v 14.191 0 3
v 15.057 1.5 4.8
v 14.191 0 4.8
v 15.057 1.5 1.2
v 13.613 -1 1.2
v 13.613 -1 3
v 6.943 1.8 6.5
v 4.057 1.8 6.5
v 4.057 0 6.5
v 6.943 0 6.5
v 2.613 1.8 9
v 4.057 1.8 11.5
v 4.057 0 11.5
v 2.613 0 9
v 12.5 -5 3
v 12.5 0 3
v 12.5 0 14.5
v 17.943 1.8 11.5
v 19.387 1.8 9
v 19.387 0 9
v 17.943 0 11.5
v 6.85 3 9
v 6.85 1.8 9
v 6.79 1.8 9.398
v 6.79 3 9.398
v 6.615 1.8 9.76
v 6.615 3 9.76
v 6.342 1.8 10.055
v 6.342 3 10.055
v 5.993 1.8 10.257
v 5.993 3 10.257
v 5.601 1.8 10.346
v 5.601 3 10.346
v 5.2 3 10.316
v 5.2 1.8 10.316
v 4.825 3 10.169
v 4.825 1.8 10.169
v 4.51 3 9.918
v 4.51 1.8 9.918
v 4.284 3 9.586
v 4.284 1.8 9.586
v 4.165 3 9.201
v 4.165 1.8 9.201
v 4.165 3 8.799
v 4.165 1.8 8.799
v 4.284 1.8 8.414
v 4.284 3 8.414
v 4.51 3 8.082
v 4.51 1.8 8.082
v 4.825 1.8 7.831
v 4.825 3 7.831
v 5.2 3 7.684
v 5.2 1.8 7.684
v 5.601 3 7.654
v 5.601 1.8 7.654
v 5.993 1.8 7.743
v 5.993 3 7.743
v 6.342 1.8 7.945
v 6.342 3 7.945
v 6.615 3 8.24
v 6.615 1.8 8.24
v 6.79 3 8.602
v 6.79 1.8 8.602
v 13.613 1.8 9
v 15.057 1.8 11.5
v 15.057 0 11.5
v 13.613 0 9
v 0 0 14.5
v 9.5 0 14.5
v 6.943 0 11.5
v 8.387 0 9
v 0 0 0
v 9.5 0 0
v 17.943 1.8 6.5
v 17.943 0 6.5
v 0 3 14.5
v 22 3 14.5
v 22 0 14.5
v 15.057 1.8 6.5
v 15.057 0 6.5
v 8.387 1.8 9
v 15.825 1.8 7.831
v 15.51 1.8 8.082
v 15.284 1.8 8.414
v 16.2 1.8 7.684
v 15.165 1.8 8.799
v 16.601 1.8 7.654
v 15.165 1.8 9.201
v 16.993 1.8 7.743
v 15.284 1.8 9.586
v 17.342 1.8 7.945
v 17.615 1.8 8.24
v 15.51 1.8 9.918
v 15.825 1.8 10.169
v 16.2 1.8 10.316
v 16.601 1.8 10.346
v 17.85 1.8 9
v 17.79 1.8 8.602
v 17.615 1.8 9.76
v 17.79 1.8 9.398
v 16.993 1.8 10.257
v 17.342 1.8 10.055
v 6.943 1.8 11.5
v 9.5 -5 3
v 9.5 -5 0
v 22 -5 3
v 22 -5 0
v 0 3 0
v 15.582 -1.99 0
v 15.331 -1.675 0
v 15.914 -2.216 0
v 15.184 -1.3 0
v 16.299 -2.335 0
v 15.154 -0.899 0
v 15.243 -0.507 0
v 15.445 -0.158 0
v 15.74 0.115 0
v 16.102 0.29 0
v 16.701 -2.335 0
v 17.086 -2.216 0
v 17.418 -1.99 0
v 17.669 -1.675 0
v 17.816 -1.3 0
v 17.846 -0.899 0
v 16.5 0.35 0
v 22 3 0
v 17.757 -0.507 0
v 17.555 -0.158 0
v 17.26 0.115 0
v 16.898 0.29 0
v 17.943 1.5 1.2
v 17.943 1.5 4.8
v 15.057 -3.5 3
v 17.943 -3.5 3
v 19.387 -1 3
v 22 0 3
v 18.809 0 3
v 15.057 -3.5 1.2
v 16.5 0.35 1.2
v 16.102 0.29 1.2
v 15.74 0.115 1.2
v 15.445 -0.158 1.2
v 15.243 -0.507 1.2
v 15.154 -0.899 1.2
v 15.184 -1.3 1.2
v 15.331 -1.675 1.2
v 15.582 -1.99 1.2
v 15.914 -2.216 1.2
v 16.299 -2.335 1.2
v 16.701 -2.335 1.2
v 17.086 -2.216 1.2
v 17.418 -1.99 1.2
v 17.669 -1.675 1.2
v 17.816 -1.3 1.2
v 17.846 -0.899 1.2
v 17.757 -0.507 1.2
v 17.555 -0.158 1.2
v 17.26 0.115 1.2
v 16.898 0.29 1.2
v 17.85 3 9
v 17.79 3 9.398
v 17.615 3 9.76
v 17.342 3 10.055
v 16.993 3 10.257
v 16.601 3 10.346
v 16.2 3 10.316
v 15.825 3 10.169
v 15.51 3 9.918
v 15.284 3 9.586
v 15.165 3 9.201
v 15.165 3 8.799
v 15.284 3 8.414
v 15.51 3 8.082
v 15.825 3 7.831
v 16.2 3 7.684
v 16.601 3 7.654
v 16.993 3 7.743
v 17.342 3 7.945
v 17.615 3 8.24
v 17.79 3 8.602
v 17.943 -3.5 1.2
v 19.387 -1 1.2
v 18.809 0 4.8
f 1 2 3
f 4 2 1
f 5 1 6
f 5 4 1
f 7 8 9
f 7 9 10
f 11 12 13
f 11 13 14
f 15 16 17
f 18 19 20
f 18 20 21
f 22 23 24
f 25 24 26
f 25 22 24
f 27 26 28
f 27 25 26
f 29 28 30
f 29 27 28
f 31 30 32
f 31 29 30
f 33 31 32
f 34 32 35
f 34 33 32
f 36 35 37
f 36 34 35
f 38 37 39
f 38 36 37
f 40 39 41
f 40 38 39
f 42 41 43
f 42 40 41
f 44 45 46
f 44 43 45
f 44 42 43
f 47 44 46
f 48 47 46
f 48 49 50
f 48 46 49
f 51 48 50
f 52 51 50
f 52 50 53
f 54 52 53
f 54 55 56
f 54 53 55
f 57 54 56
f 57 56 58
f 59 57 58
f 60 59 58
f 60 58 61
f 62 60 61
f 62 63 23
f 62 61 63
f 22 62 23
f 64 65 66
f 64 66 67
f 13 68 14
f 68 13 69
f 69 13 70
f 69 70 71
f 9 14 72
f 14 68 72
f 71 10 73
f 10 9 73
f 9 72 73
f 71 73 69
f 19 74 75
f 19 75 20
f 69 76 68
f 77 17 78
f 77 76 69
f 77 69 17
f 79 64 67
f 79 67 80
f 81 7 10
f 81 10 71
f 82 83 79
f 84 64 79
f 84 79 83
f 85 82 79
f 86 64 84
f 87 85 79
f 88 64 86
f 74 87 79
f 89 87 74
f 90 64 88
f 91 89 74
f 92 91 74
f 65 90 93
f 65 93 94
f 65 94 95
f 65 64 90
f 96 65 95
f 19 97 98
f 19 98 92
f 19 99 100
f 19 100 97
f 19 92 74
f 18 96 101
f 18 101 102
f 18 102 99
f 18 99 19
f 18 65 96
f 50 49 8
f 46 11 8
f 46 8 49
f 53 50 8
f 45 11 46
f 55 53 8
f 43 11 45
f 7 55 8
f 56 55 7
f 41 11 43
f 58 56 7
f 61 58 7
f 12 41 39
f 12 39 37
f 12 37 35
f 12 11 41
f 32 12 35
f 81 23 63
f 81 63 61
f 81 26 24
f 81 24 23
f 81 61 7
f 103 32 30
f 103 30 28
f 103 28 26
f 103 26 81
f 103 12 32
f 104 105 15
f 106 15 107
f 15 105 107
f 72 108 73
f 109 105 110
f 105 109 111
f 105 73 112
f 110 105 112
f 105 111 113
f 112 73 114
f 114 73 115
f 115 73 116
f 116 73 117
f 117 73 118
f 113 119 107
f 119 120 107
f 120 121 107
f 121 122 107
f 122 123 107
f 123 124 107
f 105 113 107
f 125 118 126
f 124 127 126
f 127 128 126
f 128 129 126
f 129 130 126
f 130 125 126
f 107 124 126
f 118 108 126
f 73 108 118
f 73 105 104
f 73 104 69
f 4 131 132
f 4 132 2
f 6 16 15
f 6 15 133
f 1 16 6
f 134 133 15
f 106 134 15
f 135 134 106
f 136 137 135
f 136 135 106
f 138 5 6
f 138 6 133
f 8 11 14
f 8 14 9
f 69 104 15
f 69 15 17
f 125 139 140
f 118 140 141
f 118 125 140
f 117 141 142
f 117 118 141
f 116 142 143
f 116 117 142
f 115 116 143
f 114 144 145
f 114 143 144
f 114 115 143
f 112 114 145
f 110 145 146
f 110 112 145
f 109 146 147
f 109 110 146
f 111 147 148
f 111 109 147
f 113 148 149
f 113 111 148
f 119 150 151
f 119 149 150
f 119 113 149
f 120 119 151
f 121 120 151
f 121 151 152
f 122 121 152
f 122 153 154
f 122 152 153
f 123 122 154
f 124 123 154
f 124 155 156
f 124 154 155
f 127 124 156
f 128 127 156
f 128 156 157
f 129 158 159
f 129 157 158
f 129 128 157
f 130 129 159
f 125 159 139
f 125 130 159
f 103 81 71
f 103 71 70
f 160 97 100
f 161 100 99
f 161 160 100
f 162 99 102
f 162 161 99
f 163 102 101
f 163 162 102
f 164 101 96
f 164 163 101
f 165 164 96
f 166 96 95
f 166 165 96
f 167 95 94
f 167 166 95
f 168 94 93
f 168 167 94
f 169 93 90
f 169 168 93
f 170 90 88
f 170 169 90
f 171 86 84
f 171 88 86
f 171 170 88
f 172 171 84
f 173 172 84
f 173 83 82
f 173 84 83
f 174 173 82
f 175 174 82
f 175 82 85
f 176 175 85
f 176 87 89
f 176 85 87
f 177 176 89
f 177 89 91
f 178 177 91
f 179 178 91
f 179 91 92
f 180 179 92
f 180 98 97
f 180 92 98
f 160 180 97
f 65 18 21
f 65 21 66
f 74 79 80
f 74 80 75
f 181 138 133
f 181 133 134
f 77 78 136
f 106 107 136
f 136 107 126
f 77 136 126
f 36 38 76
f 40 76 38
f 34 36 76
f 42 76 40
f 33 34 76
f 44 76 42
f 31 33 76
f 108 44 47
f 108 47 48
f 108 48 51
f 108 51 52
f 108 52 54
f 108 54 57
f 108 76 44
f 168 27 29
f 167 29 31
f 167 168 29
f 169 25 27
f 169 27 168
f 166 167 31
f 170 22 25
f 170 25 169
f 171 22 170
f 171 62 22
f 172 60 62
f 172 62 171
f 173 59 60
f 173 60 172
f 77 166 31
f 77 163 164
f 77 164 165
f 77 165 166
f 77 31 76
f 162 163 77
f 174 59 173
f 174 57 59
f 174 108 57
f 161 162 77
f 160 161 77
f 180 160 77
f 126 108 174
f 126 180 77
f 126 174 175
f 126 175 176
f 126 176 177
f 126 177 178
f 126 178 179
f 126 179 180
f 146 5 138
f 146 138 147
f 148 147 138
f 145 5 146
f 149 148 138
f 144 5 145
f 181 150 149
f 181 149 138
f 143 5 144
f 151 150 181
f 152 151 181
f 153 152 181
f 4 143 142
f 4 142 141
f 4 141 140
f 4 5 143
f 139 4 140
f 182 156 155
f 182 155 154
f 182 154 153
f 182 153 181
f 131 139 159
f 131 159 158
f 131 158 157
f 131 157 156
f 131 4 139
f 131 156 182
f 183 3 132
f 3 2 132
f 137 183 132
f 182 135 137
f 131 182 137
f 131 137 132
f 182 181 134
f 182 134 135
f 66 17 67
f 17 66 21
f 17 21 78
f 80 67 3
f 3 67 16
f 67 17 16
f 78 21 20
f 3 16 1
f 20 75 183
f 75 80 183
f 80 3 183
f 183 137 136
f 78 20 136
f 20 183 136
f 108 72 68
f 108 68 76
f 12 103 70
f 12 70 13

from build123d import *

# Parameters (mm, degrees)
EXTRUDE003_DEPTH  = 3.6
CYLINDER002_R     = 1.35
CYLINDER002_DEPTH = 3
EXTRUDE002_DEPTH  = 1.8
CYLINDER003_R     = 1.35
CYLINDER003_DEPTH = 30
EXTRUDE001_DEPTH  = 1.8
CYLINDER_R        = 1.35
CYLINDER_DEPTH    = 3
BOX_W             = 22
BOX_H             = 3
BOX_DEPTH         = 14.5
BOX001_W          = 12.5
BOX001_H          = 5
BOX001_DEPTH      = 3
EXTRUDE_DEPTH     = 3


with BuildPart() as extrude003:
    # Sketch003 → Extrude003 (new body)
    with BuildSketch(Plane.XY):
        Polygon((2.8868, 0), (1.4434, 2.500042), (-1.4434, 2.500042), (-2.8868, 0), (-1.4434, -2.500042), (1.4434, -2.500042), align=None)
    extrude(amount=EXTRUDE003_DEPTH)


with BuildPart() as extrude003_1:
    # Extrude003 placement: moved
    add(extrude003.part.moved(Location((16.5, -1, 1.2))))


with BuildPart() as hole03:
    # Cylinder002 → Cylinder002 (new body)
    with BuildSketch(Plane(origin=(16.5, -1, 0), x_dir=(0, 1, 0), z_dir=(0, 0, 1))):
        Circle(CYLINDER002_R)
    extrude(amount=CYLINDER002_DEPTH)

    # Fusion002: union Extrude003
    add(extrude003_1.part)


with BuildPart() as extrude002:
    # Sketch002 → Extrude002 (new body)
    with BuildSketch(Plane(origin=(16.5, 1.8, 9), x_dir=(1, 0, 0), z_dir=(0, -1, 0))):
        Polygon((2.8868, 0), (1.4434, 2.500042), (-1.4434, 2.500042), (-2.8868, 0), (-1.4434, -2.500042), (1.4434, -2.500042), align=None)
    extrude(amount=EXTRUDE002_DEPTH)


with BuildPart() as hole02:
    # Cylinder003 → Cylinder003 (new body)
    with BuildSketch(Plane(origin=(16.5, 3, 9), x_dir=(1, 0, 0), z_dir=(0, -1, 0))):
        Circle(CYLINDER003_R)
    extrude(amount=CYLINDER003_DEPTH)

    # Fusion001: union Extrude002
    add(extrude002.part)


with BuildPart() as extrude001:
    # Sketch001 → Extrude001 (new body)
    with BuildSketch(Plane(origin=(5.5, 1.8, 9), x_dir=(1, 0, 0), z_dir=(0, -1, 0))):
        Polygon((2.8868, 0), (1.4434, 2.500042), (-1.4434, 2.500042), (-2.8868, 0), (-1.4434, -2.500042), (1.4434, -2.500042), align=None)
    extrude(amount=EXTRUDE001_DEPTH)


with BuildPart() as hole01:
    # Cylinder → Cylinder (new body)
    with BuildSketch(Plane(origin=(5.5, 3, 9), x_dir=(1, 0, 0), z_dir=(0, -1, 0))):
        Circle(CYLINDER_R)
    extrude(amount=CYLINDER_DEPTH)

    # Fusion: union Extrude001
    add(extrude001.part)


with BuildPart() as cut001:
    # Box → Box (new body)
    with BuildSketch(Plane.XY):
        with Locations((11, 1.5)):
            Rectangle(BOX_W, BOX_H)
    extrude(amount=BOX_DEPTH)

    # Cut: cut Hole01
    add(hole01.part, mode=Mode.SUBTRACT)

    # Cut001: cut Hole02
    add(hole02.part, mode=Mode.SUBTRACT)


with BuildPart() as cut002:
    # Box001 → Box001 (new body)
    with BuildSketch(Plane(origin=(9.5, -5, 0), x_dir=(1, 0, 0), z_dir=(0, 0, 1))):
        with Locations((6.25, 2.5)):
            Rectangle(BOX001_W, BOX001_H)
    extrude(amount=BOX001_DEPTH)

    # Fusion003: union Cut001
    add(cut001.part)

    # Cut002: cut Hole03
    add(hole03.part, mode=Mode.SUBTRACT)


with BuildPart() as left_hand_bracket:
    # Sketch → Extrude (new body)
    with BuildSketch(Plane(origin=(0, 0, 1.4), x_dir=(0, 1, 0), z_dir=(1, 0, 0))):
        Polygon((0, 11.5), (0, 0), (-5, 0), align=None)
    extrude(amount=EXTRUDE_DEPTH)


with BuildPart() as left_hand_bracket_1:
    # Extrude placement: moved
    add(left_hand_bracket.part.moved(Location((9.5, 0, 1.6))))

    # Fusion004: union Cut002
    add(cut002.part)


solid = left_hand_bracket_1.part
